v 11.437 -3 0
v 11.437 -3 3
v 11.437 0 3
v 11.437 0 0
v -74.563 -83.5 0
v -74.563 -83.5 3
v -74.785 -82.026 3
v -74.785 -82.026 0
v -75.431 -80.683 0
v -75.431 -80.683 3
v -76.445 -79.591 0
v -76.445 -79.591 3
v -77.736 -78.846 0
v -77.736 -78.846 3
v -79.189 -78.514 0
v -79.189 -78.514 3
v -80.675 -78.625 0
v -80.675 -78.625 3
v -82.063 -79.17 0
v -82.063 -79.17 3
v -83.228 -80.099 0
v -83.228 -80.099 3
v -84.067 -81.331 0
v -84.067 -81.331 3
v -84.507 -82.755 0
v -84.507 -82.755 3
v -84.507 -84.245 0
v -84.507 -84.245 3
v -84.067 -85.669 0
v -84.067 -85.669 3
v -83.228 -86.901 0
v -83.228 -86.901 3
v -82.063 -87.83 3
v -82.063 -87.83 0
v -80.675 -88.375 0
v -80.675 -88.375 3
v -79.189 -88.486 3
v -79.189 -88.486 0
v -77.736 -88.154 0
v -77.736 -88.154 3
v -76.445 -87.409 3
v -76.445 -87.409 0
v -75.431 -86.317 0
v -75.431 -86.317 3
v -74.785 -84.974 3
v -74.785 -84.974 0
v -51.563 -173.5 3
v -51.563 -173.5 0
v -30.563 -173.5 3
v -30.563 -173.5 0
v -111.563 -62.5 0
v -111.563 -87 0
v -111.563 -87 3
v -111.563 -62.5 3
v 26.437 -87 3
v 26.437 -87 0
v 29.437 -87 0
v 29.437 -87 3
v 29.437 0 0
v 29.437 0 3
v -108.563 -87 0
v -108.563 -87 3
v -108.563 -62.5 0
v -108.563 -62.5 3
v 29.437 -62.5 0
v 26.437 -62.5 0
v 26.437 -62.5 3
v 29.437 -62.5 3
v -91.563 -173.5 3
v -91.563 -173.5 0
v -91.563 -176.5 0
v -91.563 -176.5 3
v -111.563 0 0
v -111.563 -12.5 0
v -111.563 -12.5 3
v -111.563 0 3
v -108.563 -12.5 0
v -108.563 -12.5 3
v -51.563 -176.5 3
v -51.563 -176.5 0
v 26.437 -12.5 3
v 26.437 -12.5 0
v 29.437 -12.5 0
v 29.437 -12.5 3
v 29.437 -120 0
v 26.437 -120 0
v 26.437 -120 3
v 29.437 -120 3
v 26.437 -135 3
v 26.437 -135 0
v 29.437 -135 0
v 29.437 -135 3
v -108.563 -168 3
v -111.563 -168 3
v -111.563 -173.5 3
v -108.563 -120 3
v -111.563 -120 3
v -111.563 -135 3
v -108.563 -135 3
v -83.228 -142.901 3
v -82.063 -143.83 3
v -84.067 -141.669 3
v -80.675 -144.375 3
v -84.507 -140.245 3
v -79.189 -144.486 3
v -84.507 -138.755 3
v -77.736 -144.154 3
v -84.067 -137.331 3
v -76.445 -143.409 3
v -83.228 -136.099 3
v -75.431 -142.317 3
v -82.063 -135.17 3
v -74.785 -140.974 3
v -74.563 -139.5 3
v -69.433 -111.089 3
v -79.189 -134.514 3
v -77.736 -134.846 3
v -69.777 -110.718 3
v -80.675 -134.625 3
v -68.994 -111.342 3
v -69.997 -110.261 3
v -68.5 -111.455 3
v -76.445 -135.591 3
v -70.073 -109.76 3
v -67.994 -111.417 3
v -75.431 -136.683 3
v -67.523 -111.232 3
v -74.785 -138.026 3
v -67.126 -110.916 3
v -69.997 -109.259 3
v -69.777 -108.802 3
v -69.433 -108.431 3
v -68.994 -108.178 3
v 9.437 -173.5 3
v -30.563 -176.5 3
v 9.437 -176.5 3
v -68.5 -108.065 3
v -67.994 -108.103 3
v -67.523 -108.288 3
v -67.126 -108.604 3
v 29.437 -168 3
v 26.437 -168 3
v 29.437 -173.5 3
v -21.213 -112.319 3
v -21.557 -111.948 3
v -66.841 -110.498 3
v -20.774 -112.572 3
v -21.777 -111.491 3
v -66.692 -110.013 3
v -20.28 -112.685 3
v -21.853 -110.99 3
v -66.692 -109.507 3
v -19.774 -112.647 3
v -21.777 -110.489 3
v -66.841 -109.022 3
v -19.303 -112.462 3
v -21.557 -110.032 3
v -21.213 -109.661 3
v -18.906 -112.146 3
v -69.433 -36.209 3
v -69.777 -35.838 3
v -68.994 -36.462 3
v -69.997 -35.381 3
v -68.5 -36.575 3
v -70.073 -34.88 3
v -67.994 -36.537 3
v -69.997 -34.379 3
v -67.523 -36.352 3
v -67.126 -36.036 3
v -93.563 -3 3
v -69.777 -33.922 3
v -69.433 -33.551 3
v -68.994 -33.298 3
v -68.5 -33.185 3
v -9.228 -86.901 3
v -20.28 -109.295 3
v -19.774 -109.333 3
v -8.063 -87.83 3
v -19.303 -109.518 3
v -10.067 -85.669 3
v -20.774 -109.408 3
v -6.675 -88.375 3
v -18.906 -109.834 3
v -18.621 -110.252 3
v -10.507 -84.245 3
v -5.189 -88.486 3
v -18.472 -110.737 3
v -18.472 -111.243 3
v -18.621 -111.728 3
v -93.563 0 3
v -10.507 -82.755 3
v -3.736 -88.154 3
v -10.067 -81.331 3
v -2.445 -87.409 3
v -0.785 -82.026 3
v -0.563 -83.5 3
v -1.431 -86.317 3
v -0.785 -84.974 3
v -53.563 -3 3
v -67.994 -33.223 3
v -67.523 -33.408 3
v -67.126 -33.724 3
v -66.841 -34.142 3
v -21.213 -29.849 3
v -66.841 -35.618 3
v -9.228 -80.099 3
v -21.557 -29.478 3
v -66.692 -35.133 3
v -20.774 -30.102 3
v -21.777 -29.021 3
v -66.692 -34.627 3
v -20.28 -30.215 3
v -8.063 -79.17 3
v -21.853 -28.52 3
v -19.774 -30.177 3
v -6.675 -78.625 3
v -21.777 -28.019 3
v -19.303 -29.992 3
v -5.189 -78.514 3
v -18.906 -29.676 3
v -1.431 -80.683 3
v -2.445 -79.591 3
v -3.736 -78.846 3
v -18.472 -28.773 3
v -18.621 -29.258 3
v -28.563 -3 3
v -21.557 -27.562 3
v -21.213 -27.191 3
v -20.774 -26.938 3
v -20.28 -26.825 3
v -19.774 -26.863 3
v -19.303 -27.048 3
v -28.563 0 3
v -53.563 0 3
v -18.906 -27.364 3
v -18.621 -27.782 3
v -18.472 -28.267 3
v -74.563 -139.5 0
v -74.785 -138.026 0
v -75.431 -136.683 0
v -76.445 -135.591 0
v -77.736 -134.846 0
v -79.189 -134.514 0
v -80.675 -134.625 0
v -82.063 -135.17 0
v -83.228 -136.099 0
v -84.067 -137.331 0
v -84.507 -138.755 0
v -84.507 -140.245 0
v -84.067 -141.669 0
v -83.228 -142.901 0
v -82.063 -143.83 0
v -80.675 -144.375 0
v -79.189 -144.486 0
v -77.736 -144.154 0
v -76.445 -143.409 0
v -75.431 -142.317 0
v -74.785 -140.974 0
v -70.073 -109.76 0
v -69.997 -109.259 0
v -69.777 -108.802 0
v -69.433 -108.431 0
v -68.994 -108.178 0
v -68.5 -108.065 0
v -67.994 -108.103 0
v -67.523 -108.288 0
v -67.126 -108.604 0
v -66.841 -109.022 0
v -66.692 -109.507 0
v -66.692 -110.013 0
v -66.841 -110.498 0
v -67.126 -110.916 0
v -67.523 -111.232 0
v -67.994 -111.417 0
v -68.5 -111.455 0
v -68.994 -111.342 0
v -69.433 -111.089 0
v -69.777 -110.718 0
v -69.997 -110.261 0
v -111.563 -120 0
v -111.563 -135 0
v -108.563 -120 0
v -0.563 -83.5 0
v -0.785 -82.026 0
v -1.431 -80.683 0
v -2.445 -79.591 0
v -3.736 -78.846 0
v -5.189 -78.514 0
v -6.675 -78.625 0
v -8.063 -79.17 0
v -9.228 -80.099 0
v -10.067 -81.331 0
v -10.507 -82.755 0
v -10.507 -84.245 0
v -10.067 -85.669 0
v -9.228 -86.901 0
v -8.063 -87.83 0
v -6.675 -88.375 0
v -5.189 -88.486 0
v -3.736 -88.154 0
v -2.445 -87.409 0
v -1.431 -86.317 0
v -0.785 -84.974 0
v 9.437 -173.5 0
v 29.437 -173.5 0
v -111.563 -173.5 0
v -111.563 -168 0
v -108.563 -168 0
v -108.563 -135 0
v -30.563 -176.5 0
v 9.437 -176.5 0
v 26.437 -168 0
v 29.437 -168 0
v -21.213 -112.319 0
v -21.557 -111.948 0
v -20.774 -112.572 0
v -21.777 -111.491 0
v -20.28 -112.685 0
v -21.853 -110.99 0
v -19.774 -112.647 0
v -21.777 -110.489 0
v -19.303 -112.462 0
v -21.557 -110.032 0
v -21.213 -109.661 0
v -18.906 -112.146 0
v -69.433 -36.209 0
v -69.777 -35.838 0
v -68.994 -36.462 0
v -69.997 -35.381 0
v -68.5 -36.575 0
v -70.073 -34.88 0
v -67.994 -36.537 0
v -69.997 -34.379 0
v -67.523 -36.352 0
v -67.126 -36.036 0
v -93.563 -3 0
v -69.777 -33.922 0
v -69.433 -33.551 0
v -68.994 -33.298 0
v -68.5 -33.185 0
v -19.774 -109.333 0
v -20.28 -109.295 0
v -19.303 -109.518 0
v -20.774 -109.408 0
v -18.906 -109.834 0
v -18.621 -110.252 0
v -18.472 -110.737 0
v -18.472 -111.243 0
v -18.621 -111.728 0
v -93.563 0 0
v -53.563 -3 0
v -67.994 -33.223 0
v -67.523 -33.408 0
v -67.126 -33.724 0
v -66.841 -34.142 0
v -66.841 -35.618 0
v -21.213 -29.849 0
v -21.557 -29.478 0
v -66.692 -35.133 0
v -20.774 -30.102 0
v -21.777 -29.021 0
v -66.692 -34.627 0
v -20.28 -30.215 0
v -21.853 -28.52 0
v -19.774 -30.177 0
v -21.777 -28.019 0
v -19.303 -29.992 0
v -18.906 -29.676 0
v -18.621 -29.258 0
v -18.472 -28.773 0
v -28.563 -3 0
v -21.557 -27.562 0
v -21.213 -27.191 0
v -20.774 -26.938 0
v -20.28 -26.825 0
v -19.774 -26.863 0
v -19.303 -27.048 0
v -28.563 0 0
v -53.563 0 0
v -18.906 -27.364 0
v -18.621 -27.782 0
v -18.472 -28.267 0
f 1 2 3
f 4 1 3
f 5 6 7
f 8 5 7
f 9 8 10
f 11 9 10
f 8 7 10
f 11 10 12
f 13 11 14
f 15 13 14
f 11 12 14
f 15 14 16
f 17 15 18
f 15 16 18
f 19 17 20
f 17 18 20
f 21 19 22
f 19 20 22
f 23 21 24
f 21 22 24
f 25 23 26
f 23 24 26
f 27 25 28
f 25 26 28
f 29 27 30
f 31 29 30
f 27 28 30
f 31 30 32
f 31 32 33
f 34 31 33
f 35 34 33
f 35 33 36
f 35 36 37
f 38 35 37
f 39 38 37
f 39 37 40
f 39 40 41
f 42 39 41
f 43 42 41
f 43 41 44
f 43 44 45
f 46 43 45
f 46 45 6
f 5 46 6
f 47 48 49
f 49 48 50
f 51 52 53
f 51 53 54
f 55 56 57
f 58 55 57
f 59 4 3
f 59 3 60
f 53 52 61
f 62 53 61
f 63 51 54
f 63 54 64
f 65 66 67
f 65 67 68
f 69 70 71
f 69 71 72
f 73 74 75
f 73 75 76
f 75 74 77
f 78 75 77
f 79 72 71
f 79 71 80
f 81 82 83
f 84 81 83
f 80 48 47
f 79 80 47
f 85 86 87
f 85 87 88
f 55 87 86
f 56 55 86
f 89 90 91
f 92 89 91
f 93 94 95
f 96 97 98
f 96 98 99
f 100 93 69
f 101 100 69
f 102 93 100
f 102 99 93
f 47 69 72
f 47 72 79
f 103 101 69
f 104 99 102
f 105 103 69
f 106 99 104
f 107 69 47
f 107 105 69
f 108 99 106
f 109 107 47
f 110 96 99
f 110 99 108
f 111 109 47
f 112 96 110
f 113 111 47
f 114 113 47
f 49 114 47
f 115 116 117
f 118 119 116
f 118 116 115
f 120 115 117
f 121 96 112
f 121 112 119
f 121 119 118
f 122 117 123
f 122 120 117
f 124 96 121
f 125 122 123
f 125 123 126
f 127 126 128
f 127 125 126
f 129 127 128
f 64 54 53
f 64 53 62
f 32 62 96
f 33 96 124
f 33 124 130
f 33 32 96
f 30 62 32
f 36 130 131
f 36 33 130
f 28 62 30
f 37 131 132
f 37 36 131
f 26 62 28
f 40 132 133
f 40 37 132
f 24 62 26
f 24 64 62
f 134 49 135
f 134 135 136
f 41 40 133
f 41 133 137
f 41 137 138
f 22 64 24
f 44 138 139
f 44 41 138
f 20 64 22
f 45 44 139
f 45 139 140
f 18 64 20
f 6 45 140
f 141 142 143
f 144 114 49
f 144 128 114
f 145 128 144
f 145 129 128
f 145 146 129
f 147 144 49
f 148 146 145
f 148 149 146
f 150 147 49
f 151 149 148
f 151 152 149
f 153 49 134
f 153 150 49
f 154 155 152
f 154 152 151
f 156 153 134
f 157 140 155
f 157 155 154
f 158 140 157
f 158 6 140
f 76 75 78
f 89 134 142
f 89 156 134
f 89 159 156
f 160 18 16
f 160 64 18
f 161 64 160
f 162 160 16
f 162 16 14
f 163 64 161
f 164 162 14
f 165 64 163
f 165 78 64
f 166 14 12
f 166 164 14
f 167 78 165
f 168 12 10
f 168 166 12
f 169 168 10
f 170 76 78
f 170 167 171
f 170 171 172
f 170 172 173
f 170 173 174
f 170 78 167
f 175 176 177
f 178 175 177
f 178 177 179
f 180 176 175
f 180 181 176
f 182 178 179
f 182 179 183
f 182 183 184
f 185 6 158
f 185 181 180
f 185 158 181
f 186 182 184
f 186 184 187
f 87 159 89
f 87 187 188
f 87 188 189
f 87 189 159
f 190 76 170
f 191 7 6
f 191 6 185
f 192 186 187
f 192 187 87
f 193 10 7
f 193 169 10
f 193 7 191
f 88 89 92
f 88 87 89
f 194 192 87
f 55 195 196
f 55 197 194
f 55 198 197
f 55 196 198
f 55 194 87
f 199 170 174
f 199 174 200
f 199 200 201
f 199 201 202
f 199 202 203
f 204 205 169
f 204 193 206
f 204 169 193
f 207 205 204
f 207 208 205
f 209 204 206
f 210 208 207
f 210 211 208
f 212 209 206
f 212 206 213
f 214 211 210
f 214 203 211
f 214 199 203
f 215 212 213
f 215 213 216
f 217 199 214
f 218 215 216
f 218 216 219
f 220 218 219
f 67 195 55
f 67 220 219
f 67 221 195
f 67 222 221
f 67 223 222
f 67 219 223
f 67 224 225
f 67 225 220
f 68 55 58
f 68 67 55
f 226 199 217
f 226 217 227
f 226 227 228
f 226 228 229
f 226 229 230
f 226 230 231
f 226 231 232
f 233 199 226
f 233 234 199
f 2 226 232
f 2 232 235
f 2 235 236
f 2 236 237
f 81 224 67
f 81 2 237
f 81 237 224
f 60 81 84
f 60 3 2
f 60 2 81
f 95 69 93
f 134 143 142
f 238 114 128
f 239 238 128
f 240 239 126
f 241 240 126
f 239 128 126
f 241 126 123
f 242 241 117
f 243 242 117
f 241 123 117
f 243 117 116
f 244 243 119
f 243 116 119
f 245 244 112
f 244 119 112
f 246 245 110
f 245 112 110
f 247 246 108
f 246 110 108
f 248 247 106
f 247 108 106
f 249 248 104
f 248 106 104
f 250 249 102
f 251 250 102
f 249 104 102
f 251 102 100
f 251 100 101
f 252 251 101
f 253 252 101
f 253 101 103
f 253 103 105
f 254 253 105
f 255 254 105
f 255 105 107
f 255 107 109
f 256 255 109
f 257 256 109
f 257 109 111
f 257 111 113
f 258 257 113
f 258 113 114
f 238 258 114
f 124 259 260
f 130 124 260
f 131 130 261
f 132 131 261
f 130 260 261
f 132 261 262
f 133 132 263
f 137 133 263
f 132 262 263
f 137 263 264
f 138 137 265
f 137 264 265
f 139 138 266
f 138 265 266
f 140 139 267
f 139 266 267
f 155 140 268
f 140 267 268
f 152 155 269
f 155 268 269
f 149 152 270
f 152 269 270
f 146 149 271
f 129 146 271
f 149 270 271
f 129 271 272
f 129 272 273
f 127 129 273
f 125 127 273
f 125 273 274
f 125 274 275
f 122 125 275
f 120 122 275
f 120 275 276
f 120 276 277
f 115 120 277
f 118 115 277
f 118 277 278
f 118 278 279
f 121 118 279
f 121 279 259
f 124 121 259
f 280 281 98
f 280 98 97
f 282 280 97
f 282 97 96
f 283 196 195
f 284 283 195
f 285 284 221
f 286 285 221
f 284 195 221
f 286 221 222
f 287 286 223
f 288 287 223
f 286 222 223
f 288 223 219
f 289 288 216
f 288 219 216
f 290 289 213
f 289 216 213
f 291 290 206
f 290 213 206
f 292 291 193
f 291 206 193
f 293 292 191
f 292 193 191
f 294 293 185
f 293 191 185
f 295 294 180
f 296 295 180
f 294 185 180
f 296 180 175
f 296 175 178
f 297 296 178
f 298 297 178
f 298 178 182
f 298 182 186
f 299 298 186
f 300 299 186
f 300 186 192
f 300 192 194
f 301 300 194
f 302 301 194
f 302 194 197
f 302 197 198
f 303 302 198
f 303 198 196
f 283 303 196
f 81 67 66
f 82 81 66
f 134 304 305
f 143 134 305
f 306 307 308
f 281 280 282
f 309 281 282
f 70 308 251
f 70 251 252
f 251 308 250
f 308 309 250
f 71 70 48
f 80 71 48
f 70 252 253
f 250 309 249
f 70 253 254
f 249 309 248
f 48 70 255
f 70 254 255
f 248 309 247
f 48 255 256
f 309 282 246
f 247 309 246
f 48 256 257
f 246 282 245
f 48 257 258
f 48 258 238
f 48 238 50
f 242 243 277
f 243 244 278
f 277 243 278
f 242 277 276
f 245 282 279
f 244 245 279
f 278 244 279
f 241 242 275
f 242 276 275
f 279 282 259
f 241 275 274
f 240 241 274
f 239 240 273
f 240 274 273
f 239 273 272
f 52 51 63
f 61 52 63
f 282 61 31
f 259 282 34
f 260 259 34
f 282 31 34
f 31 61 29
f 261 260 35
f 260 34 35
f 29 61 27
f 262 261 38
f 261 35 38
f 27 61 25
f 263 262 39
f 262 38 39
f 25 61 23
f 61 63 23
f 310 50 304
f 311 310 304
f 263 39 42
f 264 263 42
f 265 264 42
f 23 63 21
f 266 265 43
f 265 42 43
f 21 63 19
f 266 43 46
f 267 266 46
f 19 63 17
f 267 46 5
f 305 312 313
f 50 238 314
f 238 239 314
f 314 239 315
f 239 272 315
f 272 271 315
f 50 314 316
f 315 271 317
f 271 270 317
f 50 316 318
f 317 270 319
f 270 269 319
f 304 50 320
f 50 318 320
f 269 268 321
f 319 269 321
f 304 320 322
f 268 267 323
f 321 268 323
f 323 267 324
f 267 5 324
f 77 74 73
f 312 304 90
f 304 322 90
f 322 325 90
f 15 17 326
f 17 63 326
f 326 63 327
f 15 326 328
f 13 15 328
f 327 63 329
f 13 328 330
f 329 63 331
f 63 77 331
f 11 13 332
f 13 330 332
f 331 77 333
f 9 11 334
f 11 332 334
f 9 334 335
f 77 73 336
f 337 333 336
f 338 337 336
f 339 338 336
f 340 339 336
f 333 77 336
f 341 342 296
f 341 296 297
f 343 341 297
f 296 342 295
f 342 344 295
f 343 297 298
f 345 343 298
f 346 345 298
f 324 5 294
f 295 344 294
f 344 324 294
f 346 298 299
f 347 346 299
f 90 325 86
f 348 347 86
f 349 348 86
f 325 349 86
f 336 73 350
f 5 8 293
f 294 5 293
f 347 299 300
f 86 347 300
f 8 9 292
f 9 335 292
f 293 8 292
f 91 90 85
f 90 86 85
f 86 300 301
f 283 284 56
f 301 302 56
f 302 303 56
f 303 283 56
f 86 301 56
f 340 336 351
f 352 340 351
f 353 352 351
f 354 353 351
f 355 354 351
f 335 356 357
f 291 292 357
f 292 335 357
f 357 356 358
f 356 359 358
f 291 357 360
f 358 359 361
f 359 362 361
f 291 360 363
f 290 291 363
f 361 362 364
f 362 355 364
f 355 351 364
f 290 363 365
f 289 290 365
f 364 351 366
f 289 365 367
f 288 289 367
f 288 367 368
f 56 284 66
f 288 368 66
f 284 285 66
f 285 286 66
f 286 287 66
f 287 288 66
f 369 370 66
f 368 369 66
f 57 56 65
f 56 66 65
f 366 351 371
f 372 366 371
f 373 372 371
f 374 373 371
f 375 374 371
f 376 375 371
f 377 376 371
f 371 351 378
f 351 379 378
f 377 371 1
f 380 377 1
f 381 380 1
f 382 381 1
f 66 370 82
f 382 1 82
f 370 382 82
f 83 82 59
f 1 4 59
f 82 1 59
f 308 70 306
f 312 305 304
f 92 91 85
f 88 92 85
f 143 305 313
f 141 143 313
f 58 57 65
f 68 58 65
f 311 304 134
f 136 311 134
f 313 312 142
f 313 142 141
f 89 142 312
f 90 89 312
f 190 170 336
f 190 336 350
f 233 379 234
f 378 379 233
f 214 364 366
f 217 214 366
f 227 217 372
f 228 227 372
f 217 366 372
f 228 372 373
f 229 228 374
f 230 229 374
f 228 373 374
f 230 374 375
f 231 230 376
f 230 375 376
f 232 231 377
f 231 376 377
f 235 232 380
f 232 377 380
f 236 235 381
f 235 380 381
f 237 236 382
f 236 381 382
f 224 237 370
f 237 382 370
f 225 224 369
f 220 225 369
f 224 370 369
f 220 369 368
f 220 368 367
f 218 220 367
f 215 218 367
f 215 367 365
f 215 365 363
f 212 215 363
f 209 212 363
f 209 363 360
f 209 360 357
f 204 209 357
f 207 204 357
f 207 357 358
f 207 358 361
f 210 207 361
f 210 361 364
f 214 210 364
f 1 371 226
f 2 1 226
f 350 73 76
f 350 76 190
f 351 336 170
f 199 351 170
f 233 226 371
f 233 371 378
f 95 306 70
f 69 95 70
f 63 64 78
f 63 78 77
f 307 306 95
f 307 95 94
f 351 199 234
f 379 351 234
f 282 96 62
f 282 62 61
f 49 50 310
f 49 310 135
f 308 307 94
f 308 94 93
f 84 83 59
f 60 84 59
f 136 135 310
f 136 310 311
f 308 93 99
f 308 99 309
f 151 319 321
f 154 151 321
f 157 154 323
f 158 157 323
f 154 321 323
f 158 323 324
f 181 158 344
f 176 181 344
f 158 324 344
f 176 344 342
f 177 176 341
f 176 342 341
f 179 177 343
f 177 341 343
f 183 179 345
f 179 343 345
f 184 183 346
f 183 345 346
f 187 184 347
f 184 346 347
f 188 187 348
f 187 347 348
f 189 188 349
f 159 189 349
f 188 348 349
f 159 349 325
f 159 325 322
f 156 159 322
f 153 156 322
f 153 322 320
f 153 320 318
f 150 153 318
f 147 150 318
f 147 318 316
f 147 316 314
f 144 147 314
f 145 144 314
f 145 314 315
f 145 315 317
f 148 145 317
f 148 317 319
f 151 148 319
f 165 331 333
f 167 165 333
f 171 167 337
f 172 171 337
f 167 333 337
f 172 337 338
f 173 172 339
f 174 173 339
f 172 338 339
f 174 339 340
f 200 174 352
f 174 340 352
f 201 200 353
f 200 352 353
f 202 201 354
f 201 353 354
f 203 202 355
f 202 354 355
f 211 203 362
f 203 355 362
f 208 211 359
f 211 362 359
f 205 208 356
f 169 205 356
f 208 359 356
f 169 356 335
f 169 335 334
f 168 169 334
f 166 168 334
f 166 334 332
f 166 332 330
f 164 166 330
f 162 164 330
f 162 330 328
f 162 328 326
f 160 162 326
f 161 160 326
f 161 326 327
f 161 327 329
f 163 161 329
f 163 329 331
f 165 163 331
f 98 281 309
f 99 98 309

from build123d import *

# Parameters (mm, degrees)
ESQUISSE1_W                     = 141
ESQUISSE1_H                     = 173.5
BOSS_EXTRU_1_DEPTH              = 3
EMPREINTE1_START                = -93.562592566
EMPREINTE1_OUTLINE_W            = 3
EMPREINTE1_OUTLINE_H            = 3
EMPREINTE1_DEPTH                = 40
EMPREINTE1_START_2              = -28.562592566
EMPREINTE1_2_OUTLINE_W          = 3
EMPREINTE1_2_OUTLINE_H          = 3
EMPREINTE1_2_DEPTH              = 40
ESQUISSE2_W                     = 40
ESQUISSE2_H                     = 3
BOSS_EXTRU_2_DEPTH              = 3
EMPREINTE2_START                = -62.5
EMPREINTE2_OUTLINE_W            = 3
EMPREINTE2_OUTLINE_H            = 3
EMPREINTE2_DEPTH                = 50
EMPREINTE2_START_2              = -168
EMPREINTE2_2_OUTLINE_W          = 3
EMPREINTE2_2_OUTLINE_H          = 3
EMPREINTE2_2_DEPTH              = 33
EMPREINTE2_START_3              = -120
EMPREINTE2_3_OUTLINE_W          = 3
EMPREINTE2_3_OUTLINE_H          = 3
EMPREINTE2_3_DEPTH              = 33
D_GAGEMENT_M31_D                = 3.4
DIAM_TRE_DU_PER_AGE_10_0_10_1_D = 10


# Read off the part's stored shape, not the designer's step: Empreinte1, Empreinte2
with BuildPart() as part:
    # Esquisse1 → Boss.-Extru.1 (new body)
    with BuildSketch(Plane.XY):
        with Locations((-41.062592566, -86.75)):
            Rectangle(ESQUISSE1_W, ESQUISSE1_H)
    extrude(amount=BOSS_EXTRU_1_DEPTH)

    # Empreinte1 outline → Empreinte1 (cut)
    with BuildSketch(Plane.YZ.offset(EMPREINTE1_START)):
        with Locations((-1.5, 1.5)):
            Rectangle(EMPREINTE1_OUTLINE_W, EMPREINTE1_OUTLINE_H)
    extrude(amount=EMPREINTE1_DEPTH, mode=Mode.SUBTRACT)

    # Empreinte1 2 outline → Empreinte1 2 (cut)
    with BuildSketch(Plane.YZ.offset(EMPREINTE1_START_2)):
        with Locations((-1.5, 1.5)):
            Rectangle(EMPREINTE1_2_OUTLINE_W, EMPREINTE1_2_OUTLINE_H)
    extrude(amount=EMPREINTE1_2_DEPTH, mode=Mode.SUBTRACT)

    # Esquisse2 → Boss.-Extru.2 (add)
    with BuildSketch(Plane.XZ.offset(173.5)):
        with Locations((-10.562592566, 1.5)):
            Rectangle(ESQUISSE2_W, ESQUISSE2_H)
        with Locations((-71.562592566, 1.5)):
            Rectangle(ESQUISSE2_W, ESQUISSE2_H)
    extrude(amount=BOSS_EXTRU_2_DEPTH)

    # Empreinte2 outline → Empreinte2 (cut)
    with BuildSketch(Plane(origin=(0, 0, 0), x_dir=(1, 0, 0), z_dir=(0, 1, 0)).offset(EMPREINTE2_START)):
        with Locations((27.937407434, -1.5)):
            Rectangle(EMPREINTE2_OUTLINE_W, EMPREINTE2_OUTLINE_H)
        with Locations((-110.062592566, -1.5)):
            Rectangle(EMPREINTE2_OUTLINE_W, EMPREINTE2_OUTLINE_H)
    extrude(amount=EMPREINTE2_DEPTH, mode=Mode.SUBTRACT)

    # Empreinte2 2 outline → Empreinte2 2 (cut)
    with BuildSketch(Plane(origin=(0, 0, 0), x_dir=(1, 0, 0), z_dir=(0, 1, 0)).offset(EMPREINTE2_START_2)):
        with Locations((27.937407434, -1.5)):
            Rectangle(EMPREINTE2_2_OUTLINE_W, EMPREINTE2_2_OUTLINE_H)
        with Locations((-110.062592566, -1.5)):
            Rectangle(EMPREINTE2_2_OUTLINE_W, EMPREINTE2_2_OUTLINE_H)
    extrude(amount=EMPREINTE2_2_DEPTH, mode=Mode.SUBTRACT)

    # Empreinte2 3 outline → Empreinte2 3 (cut)
    with BuildSketch(Plane(origin=(0, 0, 0), x_dir=(1, 0, 0), z_dir=(0, 1, 0)).offset(EMPREINTE2_START_3)):
        with Locations((27.937407434, -1.5)):
            Rectangle(EMPREINTE2_3_OUTLINE_W, EMPREINTE2_3_OUTLINE_H)
        with Locations((-110.062592566, -1.5)):
            Rectangle(EMPREINTE2_3_OUTLINE_W, EMPREINTE2_3_OUTLINE_H)
    extrude(amount=EMPREINTE2_3_DEPTH, mode=Mode.SUBTRACT)

    # Dégagement M31 (through all)
    with Locations(Plane.XY.offset(3)):
        with Locations((-68.372592566, -34.88), (-20.152592566, -28.52), (-68.372592566, -109.76), (-20.152592566, -110.99)):
            Hole(D_GAGEMENT_M31_D / 2)

    # Diamètre du perçage Ø10.0 (10)1 (through all)
    with Locations(Plane(origin=(0, 0, 0), x_dir=(-1, 0, 0), z_dir=(0, 0, -1))):
        with Locations((79.562592566, -139.5), (79.562592566, -83.5), (5.562592566, -83.5)):
            Hole(DIAM_TRE_DU_PER_AGE_10_0_10_1_D / 2)


solid = part.part
